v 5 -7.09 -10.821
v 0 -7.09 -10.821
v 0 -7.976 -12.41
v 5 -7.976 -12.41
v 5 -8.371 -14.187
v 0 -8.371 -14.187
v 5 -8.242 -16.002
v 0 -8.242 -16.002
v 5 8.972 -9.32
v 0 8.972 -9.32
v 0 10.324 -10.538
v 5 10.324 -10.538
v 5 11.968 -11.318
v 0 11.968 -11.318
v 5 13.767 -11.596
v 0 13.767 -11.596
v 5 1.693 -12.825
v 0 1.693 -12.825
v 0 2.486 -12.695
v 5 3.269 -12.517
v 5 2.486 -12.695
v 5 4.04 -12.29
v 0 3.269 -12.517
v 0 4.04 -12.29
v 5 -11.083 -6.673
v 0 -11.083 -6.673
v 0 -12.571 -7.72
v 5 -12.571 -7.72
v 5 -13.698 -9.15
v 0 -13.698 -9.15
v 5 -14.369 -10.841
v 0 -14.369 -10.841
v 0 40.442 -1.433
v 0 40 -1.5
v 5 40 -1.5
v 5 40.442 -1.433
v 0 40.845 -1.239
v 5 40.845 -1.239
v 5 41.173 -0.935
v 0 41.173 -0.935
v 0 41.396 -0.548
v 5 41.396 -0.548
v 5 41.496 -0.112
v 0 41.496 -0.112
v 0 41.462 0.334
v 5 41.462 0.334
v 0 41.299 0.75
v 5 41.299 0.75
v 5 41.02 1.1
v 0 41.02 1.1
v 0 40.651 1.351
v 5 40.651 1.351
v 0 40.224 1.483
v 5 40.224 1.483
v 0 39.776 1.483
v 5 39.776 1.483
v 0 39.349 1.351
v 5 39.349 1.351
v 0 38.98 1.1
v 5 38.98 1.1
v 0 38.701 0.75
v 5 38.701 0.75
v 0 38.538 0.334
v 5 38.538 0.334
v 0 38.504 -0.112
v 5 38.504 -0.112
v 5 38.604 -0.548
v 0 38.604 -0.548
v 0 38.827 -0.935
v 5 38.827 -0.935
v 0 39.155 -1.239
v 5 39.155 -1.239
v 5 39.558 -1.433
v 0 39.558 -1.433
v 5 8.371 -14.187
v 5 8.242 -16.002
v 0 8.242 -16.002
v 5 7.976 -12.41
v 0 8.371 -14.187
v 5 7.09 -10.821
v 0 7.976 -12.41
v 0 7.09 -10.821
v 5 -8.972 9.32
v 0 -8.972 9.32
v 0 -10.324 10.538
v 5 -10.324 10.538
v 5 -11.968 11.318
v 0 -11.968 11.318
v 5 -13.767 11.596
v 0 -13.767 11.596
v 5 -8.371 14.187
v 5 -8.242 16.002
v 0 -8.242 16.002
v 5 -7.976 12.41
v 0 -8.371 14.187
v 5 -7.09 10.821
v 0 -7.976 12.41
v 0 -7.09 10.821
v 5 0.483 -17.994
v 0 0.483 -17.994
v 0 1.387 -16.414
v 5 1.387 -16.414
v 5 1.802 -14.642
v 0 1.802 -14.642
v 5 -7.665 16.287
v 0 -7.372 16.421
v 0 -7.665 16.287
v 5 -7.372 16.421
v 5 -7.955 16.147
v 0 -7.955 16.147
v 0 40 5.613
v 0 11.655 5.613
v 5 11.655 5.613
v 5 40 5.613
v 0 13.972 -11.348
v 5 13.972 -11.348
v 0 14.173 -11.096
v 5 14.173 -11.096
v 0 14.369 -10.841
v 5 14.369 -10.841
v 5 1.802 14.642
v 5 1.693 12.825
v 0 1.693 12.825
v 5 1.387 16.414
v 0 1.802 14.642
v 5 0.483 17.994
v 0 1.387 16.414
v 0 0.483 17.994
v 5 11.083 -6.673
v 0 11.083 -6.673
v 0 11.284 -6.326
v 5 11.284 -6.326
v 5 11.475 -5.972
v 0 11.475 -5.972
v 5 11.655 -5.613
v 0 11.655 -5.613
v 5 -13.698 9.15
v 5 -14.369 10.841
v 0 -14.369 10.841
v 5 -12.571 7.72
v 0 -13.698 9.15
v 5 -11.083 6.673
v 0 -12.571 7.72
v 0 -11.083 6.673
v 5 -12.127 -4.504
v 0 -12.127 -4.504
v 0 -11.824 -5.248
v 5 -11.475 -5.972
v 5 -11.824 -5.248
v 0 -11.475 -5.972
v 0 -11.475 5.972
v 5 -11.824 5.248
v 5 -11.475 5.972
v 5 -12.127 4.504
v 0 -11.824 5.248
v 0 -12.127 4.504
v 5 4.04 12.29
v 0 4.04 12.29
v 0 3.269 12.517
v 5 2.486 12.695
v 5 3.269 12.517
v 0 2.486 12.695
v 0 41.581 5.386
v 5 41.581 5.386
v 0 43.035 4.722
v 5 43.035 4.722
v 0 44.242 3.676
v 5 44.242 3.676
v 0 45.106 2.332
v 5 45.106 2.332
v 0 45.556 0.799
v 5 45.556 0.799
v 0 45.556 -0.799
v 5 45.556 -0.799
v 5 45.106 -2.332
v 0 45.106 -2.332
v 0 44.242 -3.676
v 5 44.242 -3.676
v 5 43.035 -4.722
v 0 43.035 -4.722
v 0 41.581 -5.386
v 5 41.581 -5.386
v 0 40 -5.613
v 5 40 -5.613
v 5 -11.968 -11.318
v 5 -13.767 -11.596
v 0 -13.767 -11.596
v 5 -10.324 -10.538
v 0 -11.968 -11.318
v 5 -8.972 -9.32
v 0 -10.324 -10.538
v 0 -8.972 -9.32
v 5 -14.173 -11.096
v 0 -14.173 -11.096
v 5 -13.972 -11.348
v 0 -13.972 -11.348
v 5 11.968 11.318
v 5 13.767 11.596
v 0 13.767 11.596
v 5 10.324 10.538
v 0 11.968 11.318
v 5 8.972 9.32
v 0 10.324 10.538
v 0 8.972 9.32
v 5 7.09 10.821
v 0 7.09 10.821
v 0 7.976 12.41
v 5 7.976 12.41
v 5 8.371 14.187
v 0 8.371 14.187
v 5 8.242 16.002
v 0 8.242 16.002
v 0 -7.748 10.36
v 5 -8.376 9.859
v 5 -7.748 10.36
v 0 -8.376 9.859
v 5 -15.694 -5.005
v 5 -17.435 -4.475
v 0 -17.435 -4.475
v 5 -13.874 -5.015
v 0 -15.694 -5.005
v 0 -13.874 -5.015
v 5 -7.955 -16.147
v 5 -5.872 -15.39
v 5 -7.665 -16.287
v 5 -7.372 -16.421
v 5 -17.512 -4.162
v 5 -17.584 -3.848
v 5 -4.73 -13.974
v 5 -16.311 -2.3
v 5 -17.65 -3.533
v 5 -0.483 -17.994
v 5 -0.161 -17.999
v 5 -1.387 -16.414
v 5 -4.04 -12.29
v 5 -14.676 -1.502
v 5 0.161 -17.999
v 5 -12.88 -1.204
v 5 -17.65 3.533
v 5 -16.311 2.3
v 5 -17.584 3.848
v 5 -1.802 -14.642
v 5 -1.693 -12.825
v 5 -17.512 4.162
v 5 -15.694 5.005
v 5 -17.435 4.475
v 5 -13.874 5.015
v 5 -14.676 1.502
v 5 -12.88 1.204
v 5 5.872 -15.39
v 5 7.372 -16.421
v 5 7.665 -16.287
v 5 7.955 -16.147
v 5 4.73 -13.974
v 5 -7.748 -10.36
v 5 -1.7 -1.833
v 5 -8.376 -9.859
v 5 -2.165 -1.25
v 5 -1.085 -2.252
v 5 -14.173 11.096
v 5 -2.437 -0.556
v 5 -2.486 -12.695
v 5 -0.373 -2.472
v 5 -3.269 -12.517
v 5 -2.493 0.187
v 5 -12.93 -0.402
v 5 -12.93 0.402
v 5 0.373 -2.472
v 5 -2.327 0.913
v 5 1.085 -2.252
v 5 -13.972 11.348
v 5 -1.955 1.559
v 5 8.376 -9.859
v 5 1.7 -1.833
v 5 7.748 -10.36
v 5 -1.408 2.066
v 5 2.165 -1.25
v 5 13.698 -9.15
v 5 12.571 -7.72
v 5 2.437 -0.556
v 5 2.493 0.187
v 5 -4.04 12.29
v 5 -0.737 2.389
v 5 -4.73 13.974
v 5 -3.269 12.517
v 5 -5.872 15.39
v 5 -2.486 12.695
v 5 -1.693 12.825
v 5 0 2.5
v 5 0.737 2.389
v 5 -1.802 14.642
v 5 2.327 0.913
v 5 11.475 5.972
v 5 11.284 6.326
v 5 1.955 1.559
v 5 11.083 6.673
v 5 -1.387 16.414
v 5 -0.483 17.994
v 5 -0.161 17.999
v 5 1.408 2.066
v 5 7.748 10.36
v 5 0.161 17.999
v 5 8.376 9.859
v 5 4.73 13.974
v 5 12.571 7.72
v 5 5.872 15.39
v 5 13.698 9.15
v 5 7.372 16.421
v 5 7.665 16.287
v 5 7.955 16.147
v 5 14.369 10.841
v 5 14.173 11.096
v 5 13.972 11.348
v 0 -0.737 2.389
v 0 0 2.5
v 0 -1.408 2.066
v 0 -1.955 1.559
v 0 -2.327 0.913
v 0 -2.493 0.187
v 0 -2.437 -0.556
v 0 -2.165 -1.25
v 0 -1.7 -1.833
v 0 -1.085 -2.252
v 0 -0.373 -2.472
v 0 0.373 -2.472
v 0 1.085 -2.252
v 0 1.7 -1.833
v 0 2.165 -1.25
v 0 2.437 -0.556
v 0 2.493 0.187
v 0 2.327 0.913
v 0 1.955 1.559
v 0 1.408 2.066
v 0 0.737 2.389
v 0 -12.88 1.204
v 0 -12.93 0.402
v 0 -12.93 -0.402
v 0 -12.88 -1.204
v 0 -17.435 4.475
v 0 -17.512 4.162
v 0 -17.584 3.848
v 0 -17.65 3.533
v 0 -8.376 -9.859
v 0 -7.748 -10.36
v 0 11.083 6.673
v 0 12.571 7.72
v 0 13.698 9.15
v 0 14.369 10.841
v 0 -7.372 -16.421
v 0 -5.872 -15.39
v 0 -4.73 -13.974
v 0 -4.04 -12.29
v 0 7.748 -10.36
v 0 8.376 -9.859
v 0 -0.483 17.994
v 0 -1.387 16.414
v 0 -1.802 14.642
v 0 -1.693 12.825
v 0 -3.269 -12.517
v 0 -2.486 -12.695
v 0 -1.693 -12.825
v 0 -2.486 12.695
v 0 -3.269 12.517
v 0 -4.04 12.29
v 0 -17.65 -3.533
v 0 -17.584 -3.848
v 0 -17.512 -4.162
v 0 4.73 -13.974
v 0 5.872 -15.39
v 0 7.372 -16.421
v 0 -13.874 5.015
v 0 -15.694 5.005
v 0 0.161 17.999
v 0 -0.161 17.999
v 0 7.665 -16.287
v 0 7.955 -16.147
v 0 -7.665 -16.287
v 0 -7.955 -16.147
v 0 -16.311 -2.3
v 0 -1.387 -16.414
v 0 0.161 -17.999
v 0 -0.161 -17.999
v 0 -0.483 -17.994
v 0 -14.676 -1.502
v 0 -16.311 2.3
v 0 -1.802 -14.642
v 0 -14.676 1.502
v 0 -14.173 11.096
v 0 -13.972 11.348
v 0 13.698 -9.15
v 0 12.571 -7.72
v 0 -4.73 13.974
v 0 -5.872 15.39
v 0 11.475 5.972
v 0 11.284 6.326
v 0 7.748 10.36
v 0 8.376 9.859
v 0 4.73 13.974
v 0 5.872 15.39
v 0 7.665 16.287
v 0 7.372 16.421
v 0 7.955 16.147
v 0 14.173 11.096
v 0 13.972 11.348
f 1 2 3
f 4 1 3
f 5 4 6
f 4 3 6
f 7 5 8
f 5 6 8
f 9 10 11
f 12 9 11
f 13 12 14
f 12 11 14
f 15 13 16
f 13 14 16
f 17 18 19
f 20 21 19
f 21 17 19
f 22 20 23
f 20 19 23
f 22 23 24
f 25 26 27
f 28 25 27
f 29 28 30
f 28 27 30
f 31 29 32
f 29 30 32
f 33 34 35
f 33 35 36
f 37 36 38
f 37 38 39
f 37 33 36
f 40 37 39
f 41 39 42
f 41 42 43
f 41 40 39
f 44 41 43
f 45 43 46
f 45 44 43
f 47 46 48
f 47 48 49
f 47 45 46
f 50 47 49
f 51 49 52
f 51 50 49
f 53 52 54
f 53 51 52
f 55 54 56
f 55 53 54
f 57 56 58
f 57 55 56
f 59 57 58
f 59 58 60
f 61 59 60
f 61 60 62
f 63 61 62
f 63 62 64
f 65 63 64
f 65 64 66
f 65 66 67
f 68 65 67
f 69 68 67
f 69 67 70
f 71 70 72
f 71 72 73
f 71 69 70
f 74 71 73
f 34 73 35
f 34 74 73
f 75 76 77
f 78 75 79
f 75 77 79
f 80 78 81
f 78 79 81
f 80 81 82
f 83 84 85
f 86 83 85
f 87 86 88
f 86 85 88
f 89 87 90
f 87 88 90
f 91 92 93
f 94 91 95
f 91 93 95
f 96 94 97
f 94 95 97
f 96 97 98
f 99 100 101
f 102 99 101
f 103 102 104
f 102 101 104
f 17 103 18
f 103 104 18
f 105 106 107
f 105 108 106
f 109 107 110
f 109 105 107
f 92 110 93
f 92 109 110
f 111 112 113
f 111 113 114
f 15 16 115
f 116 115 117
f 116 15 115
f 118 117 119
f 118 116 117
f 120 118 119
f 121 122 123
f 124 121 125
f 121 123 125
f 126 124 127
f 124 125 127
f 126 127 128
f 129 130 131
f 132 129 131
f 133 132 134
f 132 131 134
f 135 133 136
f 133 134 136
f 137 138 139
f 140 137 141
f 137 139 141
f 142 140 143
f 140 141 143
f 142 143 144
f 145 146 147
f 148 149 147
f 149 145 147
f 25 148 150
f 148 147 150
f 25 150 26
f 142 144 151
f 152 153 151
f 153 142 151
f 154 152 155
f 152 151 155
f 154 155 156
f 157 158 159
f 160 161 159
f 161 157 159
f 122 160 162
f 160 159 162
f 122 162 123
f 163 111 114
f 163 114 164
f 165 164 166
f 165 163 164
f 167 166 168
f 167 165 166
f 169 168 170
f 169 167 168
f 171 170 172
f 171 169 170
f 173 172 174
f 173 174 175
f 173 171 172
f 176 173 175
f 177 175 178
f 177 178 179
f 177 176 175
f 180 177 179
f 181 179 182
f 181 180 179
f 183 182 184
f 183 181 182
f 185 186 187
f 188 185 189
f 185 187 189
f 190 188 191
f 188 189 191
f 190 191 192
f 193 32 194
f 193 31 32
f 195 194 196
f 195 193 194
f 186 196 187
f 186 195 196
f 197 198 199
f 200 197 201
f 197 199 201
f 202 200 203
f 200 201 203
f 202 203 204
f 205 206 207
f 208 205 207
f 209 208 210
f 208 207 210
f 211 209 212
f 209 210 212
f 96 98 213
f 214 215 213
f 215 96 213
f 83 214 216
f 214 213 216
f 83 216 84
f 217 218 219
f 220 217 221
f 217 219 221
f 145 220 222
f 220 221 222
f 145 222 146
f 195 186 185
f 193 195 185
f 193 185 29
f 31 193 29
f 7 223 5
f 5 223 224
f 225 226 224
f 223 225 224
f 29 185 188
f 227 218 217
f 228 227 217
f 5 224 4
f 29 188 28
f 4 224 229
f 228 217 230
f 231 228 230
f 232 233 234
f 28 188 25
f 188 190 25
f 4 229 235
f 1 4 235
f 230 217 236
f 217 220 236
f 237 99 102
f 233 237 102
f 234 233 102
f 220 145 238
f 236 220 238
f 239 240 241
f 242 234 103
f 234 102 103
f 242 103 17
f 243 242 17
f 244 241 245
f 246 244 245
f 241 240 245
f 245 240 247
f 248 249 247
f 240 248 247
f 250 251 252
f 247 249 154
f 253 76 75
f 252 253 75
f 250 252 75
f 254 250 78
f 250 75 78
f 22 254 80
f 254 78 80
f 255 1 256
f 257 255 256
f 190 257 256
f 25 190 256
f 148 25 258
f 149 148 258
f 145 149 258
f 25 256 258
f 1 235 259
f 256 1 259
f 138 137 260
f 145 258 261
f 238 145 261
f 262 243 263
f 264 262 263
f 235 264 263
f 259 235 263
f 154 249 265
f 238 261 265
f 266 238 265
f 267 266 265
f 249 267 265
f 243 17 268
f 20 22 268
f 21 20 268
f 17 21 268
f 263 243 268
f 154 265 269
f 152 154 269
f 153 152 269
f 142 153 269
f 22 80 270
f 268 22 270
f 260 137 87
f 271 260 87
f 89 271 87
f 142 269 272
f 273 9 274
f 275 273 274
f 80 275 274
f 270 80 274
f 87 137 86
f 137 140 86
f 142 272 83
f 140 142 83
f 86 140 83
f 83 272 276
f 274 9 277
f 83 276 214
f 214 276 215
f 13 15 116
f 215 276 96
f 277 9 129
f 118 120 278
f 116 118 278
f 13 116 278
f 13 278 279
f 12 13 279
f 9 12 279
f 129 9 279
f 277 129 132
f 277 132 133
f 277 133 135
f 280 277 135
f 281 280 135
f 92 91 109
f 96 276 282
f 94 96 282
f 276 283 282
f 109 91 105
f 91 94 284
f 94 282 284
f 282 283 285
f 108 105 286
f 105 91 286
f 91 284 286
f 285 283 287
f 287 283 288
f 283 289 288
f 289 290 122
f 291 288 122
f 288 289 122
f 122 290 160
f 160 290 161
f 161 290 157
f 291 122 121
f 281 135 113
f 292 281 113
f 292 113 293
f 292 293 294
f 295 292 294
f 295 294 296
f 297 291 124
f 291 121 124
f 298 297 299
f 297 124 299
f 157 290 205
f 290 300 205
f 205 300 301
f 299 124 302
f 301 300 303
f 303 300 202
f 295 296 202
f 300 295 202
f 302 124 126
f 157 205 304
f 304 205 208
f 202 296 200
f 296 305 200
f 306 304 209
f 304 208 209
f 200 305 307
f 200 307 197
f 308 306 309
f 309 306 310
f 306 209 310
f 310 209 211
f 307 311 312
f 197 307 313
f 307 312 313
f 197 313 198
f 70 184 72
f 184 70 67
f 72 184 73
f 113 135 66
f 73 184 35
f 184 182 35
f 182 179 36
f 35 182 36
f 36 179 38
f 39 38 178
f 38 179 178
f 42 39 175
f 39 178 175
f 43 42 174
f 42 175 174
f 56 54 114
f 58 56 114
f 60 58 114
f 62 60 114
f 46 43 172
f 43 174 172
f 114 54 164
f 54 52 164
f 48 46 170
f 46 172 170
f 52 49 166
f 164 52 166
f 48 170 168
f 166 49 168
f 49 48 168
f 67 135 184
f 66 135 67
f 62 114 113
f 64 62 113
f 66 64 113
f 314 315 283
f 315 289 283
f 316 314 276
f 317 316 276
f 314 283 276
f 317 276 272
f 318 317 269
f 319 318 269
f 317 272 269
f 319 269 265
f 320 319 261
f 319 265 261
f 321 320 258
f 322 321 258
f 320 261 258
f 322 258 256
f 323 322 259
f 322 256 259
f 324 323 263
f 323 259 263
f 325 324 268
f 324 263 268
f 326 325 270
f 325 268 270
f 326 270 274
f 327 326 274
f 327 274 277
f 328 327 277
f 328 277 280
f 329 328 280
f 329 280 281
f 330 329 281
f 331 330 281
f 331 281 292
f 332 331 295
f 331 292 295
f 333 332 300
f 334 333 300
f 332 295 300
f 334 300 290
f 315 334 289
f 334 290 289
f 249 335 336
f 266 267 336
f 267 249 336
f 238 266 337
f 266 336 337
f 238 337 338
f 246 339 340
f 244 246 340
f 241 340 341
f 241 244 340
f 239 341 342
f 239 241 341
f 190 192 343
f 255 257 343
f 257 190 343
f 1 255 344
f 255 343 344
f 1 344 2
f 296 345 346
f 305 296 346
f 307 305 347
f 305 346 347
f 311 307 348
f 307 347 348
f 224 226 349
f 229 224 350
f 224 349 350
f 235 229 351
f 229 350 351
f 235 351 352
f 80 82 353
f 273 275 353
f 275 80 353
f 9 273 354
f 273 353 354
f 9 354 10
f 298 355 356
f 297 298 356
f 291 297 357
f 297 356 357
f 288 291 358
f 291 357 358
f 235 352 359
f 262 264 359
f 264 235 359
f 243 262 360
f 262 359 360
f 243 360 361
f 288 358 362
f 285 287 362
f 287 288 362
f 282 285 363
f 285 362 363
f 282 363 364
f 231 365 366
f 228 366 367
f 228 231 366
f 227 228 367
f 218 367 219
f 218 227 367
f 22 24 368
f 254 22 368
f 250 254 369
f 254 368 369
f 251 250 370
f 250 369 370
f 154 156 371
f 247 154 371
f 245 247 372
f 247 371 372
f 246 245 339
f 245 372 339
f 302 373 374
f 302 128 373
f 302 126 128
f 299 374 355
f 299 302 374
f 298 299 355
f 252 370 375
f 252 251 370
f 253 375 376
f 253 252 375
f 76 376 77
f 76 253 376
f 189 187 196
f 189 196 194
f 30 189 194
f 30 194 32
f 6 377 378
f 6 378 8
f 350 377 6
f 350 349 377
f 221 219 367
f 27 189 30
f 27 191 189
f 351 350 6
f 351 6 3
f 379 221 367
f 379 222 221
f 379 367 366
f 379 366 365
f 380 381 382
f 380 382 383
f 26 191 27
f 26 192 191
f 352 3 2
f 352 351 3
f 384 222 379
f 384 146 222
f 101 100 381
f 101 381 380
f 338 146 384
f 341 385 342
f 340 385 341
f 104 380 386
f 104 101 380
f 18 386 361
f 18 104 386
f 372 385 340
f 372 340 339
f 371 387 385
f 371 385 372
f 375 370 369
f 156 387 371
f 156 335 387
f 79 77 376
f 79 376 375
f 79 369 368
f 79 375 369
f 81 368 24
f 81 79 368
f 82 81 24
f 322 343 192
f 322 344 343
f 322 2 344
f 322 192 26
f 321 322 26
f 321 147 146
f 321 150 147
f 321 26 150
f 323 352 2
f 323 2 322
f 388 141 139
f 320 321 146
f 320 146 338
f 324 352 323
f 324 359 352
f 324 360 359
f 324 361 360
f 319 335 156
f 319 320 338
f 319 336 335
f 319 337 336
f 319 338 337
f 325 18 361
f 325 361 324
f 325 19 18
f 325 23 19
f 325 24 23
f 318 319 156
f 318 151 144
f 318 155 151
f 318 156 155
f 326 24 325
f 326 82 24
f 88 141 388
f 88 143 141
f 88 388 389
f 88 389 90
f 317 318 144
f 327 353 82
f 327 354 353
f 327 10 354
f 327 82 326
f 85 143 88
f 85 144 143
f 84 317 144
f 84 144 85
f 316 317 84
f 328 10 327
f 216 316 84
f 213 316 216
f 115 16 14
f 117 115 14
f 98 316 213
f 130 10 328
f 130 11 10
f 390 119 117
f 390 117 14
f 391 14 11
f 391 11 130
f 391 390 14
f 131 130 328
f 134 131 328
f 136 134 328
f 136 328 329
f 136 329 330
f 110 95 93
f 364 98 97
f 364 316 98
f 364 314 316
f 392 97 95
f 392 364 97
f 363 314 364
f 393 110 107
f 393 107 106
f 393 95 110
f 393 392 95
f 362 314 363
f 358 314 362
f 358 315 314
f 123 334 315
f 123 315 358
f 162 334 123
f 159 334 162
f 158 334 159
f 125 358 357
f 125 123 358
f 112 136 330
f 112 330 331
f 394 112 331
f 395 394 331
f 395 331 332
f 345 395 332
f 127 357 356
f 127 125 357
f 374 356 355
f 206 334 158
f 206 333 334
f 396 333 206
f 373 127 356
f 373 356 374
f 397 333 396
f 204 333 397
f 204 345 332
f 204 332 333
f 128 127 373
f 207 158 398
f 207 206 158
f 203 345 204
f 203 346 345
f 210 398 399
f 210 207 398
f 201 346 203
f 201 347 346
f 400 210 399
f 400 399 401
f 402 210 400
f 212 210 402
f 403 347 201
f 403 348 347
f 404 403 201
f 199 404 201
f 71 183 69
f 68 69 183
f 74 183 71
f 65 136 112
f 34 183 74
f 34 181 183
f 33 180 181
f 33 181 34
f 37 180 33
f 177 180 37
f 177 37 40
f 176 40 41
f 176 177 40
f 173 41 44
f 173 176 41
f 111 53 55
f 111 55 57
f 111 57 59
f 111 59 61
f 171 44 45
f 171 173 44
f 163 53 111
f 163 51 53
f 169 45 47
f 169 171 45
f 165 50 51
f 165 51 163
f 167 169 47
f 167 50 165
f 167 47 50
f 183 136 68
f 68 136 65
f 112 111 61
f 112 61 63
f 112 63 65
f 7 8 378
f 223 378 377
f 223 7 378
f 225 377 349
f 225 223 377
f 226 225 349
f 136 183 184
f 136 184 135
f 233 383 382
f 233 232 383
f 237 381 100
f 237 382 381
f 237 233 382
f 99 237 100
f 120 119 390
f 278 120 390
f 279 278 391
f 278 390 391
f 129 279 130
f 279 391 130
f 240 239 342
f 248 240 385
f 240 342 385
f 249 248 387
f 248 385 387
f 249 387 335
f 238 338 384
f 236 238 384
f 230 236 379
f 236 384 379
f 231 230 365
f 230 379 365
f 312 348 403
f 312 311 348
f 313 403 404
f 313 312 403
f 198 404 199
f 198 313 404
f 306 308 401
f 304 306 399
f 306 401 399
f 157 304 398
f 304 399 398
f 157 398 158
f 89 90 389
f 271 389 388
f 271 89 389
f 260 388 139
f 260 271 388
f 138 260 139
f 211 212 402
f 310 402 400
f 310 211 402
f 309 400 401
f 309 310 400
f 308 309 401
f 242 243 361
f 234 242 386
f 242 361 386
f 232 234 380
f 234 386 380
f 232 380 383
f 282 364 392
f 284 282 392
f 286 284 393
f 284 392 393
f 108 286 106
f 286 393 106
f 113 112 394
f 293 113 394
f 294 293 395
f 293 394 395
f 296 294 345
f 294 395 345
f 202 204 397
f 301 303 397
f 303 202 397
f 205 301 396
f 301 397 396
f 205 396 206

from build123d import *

# Parameters (mm, degrees)
BASPROSKE_W        = 5
BASPROSKE_H        = 18
TOOTHCUT_DEPTH     = 26.942243542
TEETHCUTS_COUNT    = 14
TEETHCUTS_ANGLE    = 334.285714286
BORSKE_R           = 2.5
BORE_DEPTH         = 50.0000508
BOSS_EXTRU_1_START = -5
ESQUISSE1_R        = 1.5
BOSS_EXTRU_1_DEPTH = 5


with BuildPart() as part:
    # BasProSke → Base-Revolve (revolve)
    with BuildSketch(Plane(origin=(0, 0, 0), x_dir=(1, 0, 0), z_dir=(0, 1, 0)), mode=Mode.PRIVATE) as base_revolve_sk:
        with Locations((2.5, 9)):
            Rectangle(BASPROSKE_W, BASPROSKE_H)
    revolve(base_revolve_sk.sketch.rotate(Axis((-10, 0, 0), (1, 0, 0)), 180), axis=Axis((-10, 0, 0), (1, 0, 0)))

    # TooCutSke → ToothCut (cut, through all)
    with BuildSketch(Plane(origin=(0, 0, 0), x_dir=(0, 0, -1), z_dir=(1, 0, 0))):
        with BuildLine():
            ThreePointArc((1.203681085, 12.880379812), (0, 12.9365), (-1.203681085, 12.880379812))
            ThreePointArc((-1.203681085, 12.880379812), (-1.848830306, 15.53724288), (-3.558778134, 17.670601103))
            ThreePointArc((-3.558778134, 17.670601103), (0, 18.0254), (3.558778134, 17.670601103))
            ThreePointArc((3.558778134, 17.670601103), (1.848830306, 15.53724288), (1.203681085, 12.880379812))
        make_face()
    toothcut = extrude(amount=TOOTHCUT_DEPTH, mode=Mode.SUBTRACT)

    # TeethCuts: ToothCut ×14 about axis
    teethcuts_axis = Axis((-10, 0, 0), (1, 0, 0))
    for i in range(1, TEETHCUTS_COUNT):
        add(toothcut.rotate(teethcuts_axis, i * TEETHCUTS_ANGLE / (TEETHCUTS_COUNT - 1)), mode=Mode.SUBTRACT)

    # BorSke → Bore (cut, symmetric)
    with BuildSketch(Plane(origin=(0, 0, 0), x_dir=(0, 0, -1), z_dir=(1, 0, 0))):
        with Locations(Location((0, 0, 0), (0, 0, 180))):
            Circle(BORSKE_R)
    extrude(amount=BORE_DEPTH, both=True, mode=Mode.SUBTRACT)

    # Esquisse1 → Boss.-Extru.1 (add)
    with BuildSketch(Plane(origin=(5, 0, 0), x_dir=(0, 0, -1), z_dir=(1, 0, 0)).offset(BOSS_EXTRU_1_START)):
        with BuildLine():
            Line((-5.612936991, 11.65538376), (-5.612936991, 40))
            ThreePointArc((-5.612936991, 40), (0, 45.612936991), (5.612936991, 40))
            Line((5.612936991, 40), (5.612936991, 11.65538376))
            ThreePointArc((5.612936991, 11.65538376), (0, 12.9365), (-5.612936991, 11.65538376))
        make_face()
        with Locations((0, 40)):
            Circle(ESQUISSE1_R, mode=Mode.SUBTRACT)
    extrude(amount=BOSS_EXTRU_1_DEPTH)


solid = part.part
